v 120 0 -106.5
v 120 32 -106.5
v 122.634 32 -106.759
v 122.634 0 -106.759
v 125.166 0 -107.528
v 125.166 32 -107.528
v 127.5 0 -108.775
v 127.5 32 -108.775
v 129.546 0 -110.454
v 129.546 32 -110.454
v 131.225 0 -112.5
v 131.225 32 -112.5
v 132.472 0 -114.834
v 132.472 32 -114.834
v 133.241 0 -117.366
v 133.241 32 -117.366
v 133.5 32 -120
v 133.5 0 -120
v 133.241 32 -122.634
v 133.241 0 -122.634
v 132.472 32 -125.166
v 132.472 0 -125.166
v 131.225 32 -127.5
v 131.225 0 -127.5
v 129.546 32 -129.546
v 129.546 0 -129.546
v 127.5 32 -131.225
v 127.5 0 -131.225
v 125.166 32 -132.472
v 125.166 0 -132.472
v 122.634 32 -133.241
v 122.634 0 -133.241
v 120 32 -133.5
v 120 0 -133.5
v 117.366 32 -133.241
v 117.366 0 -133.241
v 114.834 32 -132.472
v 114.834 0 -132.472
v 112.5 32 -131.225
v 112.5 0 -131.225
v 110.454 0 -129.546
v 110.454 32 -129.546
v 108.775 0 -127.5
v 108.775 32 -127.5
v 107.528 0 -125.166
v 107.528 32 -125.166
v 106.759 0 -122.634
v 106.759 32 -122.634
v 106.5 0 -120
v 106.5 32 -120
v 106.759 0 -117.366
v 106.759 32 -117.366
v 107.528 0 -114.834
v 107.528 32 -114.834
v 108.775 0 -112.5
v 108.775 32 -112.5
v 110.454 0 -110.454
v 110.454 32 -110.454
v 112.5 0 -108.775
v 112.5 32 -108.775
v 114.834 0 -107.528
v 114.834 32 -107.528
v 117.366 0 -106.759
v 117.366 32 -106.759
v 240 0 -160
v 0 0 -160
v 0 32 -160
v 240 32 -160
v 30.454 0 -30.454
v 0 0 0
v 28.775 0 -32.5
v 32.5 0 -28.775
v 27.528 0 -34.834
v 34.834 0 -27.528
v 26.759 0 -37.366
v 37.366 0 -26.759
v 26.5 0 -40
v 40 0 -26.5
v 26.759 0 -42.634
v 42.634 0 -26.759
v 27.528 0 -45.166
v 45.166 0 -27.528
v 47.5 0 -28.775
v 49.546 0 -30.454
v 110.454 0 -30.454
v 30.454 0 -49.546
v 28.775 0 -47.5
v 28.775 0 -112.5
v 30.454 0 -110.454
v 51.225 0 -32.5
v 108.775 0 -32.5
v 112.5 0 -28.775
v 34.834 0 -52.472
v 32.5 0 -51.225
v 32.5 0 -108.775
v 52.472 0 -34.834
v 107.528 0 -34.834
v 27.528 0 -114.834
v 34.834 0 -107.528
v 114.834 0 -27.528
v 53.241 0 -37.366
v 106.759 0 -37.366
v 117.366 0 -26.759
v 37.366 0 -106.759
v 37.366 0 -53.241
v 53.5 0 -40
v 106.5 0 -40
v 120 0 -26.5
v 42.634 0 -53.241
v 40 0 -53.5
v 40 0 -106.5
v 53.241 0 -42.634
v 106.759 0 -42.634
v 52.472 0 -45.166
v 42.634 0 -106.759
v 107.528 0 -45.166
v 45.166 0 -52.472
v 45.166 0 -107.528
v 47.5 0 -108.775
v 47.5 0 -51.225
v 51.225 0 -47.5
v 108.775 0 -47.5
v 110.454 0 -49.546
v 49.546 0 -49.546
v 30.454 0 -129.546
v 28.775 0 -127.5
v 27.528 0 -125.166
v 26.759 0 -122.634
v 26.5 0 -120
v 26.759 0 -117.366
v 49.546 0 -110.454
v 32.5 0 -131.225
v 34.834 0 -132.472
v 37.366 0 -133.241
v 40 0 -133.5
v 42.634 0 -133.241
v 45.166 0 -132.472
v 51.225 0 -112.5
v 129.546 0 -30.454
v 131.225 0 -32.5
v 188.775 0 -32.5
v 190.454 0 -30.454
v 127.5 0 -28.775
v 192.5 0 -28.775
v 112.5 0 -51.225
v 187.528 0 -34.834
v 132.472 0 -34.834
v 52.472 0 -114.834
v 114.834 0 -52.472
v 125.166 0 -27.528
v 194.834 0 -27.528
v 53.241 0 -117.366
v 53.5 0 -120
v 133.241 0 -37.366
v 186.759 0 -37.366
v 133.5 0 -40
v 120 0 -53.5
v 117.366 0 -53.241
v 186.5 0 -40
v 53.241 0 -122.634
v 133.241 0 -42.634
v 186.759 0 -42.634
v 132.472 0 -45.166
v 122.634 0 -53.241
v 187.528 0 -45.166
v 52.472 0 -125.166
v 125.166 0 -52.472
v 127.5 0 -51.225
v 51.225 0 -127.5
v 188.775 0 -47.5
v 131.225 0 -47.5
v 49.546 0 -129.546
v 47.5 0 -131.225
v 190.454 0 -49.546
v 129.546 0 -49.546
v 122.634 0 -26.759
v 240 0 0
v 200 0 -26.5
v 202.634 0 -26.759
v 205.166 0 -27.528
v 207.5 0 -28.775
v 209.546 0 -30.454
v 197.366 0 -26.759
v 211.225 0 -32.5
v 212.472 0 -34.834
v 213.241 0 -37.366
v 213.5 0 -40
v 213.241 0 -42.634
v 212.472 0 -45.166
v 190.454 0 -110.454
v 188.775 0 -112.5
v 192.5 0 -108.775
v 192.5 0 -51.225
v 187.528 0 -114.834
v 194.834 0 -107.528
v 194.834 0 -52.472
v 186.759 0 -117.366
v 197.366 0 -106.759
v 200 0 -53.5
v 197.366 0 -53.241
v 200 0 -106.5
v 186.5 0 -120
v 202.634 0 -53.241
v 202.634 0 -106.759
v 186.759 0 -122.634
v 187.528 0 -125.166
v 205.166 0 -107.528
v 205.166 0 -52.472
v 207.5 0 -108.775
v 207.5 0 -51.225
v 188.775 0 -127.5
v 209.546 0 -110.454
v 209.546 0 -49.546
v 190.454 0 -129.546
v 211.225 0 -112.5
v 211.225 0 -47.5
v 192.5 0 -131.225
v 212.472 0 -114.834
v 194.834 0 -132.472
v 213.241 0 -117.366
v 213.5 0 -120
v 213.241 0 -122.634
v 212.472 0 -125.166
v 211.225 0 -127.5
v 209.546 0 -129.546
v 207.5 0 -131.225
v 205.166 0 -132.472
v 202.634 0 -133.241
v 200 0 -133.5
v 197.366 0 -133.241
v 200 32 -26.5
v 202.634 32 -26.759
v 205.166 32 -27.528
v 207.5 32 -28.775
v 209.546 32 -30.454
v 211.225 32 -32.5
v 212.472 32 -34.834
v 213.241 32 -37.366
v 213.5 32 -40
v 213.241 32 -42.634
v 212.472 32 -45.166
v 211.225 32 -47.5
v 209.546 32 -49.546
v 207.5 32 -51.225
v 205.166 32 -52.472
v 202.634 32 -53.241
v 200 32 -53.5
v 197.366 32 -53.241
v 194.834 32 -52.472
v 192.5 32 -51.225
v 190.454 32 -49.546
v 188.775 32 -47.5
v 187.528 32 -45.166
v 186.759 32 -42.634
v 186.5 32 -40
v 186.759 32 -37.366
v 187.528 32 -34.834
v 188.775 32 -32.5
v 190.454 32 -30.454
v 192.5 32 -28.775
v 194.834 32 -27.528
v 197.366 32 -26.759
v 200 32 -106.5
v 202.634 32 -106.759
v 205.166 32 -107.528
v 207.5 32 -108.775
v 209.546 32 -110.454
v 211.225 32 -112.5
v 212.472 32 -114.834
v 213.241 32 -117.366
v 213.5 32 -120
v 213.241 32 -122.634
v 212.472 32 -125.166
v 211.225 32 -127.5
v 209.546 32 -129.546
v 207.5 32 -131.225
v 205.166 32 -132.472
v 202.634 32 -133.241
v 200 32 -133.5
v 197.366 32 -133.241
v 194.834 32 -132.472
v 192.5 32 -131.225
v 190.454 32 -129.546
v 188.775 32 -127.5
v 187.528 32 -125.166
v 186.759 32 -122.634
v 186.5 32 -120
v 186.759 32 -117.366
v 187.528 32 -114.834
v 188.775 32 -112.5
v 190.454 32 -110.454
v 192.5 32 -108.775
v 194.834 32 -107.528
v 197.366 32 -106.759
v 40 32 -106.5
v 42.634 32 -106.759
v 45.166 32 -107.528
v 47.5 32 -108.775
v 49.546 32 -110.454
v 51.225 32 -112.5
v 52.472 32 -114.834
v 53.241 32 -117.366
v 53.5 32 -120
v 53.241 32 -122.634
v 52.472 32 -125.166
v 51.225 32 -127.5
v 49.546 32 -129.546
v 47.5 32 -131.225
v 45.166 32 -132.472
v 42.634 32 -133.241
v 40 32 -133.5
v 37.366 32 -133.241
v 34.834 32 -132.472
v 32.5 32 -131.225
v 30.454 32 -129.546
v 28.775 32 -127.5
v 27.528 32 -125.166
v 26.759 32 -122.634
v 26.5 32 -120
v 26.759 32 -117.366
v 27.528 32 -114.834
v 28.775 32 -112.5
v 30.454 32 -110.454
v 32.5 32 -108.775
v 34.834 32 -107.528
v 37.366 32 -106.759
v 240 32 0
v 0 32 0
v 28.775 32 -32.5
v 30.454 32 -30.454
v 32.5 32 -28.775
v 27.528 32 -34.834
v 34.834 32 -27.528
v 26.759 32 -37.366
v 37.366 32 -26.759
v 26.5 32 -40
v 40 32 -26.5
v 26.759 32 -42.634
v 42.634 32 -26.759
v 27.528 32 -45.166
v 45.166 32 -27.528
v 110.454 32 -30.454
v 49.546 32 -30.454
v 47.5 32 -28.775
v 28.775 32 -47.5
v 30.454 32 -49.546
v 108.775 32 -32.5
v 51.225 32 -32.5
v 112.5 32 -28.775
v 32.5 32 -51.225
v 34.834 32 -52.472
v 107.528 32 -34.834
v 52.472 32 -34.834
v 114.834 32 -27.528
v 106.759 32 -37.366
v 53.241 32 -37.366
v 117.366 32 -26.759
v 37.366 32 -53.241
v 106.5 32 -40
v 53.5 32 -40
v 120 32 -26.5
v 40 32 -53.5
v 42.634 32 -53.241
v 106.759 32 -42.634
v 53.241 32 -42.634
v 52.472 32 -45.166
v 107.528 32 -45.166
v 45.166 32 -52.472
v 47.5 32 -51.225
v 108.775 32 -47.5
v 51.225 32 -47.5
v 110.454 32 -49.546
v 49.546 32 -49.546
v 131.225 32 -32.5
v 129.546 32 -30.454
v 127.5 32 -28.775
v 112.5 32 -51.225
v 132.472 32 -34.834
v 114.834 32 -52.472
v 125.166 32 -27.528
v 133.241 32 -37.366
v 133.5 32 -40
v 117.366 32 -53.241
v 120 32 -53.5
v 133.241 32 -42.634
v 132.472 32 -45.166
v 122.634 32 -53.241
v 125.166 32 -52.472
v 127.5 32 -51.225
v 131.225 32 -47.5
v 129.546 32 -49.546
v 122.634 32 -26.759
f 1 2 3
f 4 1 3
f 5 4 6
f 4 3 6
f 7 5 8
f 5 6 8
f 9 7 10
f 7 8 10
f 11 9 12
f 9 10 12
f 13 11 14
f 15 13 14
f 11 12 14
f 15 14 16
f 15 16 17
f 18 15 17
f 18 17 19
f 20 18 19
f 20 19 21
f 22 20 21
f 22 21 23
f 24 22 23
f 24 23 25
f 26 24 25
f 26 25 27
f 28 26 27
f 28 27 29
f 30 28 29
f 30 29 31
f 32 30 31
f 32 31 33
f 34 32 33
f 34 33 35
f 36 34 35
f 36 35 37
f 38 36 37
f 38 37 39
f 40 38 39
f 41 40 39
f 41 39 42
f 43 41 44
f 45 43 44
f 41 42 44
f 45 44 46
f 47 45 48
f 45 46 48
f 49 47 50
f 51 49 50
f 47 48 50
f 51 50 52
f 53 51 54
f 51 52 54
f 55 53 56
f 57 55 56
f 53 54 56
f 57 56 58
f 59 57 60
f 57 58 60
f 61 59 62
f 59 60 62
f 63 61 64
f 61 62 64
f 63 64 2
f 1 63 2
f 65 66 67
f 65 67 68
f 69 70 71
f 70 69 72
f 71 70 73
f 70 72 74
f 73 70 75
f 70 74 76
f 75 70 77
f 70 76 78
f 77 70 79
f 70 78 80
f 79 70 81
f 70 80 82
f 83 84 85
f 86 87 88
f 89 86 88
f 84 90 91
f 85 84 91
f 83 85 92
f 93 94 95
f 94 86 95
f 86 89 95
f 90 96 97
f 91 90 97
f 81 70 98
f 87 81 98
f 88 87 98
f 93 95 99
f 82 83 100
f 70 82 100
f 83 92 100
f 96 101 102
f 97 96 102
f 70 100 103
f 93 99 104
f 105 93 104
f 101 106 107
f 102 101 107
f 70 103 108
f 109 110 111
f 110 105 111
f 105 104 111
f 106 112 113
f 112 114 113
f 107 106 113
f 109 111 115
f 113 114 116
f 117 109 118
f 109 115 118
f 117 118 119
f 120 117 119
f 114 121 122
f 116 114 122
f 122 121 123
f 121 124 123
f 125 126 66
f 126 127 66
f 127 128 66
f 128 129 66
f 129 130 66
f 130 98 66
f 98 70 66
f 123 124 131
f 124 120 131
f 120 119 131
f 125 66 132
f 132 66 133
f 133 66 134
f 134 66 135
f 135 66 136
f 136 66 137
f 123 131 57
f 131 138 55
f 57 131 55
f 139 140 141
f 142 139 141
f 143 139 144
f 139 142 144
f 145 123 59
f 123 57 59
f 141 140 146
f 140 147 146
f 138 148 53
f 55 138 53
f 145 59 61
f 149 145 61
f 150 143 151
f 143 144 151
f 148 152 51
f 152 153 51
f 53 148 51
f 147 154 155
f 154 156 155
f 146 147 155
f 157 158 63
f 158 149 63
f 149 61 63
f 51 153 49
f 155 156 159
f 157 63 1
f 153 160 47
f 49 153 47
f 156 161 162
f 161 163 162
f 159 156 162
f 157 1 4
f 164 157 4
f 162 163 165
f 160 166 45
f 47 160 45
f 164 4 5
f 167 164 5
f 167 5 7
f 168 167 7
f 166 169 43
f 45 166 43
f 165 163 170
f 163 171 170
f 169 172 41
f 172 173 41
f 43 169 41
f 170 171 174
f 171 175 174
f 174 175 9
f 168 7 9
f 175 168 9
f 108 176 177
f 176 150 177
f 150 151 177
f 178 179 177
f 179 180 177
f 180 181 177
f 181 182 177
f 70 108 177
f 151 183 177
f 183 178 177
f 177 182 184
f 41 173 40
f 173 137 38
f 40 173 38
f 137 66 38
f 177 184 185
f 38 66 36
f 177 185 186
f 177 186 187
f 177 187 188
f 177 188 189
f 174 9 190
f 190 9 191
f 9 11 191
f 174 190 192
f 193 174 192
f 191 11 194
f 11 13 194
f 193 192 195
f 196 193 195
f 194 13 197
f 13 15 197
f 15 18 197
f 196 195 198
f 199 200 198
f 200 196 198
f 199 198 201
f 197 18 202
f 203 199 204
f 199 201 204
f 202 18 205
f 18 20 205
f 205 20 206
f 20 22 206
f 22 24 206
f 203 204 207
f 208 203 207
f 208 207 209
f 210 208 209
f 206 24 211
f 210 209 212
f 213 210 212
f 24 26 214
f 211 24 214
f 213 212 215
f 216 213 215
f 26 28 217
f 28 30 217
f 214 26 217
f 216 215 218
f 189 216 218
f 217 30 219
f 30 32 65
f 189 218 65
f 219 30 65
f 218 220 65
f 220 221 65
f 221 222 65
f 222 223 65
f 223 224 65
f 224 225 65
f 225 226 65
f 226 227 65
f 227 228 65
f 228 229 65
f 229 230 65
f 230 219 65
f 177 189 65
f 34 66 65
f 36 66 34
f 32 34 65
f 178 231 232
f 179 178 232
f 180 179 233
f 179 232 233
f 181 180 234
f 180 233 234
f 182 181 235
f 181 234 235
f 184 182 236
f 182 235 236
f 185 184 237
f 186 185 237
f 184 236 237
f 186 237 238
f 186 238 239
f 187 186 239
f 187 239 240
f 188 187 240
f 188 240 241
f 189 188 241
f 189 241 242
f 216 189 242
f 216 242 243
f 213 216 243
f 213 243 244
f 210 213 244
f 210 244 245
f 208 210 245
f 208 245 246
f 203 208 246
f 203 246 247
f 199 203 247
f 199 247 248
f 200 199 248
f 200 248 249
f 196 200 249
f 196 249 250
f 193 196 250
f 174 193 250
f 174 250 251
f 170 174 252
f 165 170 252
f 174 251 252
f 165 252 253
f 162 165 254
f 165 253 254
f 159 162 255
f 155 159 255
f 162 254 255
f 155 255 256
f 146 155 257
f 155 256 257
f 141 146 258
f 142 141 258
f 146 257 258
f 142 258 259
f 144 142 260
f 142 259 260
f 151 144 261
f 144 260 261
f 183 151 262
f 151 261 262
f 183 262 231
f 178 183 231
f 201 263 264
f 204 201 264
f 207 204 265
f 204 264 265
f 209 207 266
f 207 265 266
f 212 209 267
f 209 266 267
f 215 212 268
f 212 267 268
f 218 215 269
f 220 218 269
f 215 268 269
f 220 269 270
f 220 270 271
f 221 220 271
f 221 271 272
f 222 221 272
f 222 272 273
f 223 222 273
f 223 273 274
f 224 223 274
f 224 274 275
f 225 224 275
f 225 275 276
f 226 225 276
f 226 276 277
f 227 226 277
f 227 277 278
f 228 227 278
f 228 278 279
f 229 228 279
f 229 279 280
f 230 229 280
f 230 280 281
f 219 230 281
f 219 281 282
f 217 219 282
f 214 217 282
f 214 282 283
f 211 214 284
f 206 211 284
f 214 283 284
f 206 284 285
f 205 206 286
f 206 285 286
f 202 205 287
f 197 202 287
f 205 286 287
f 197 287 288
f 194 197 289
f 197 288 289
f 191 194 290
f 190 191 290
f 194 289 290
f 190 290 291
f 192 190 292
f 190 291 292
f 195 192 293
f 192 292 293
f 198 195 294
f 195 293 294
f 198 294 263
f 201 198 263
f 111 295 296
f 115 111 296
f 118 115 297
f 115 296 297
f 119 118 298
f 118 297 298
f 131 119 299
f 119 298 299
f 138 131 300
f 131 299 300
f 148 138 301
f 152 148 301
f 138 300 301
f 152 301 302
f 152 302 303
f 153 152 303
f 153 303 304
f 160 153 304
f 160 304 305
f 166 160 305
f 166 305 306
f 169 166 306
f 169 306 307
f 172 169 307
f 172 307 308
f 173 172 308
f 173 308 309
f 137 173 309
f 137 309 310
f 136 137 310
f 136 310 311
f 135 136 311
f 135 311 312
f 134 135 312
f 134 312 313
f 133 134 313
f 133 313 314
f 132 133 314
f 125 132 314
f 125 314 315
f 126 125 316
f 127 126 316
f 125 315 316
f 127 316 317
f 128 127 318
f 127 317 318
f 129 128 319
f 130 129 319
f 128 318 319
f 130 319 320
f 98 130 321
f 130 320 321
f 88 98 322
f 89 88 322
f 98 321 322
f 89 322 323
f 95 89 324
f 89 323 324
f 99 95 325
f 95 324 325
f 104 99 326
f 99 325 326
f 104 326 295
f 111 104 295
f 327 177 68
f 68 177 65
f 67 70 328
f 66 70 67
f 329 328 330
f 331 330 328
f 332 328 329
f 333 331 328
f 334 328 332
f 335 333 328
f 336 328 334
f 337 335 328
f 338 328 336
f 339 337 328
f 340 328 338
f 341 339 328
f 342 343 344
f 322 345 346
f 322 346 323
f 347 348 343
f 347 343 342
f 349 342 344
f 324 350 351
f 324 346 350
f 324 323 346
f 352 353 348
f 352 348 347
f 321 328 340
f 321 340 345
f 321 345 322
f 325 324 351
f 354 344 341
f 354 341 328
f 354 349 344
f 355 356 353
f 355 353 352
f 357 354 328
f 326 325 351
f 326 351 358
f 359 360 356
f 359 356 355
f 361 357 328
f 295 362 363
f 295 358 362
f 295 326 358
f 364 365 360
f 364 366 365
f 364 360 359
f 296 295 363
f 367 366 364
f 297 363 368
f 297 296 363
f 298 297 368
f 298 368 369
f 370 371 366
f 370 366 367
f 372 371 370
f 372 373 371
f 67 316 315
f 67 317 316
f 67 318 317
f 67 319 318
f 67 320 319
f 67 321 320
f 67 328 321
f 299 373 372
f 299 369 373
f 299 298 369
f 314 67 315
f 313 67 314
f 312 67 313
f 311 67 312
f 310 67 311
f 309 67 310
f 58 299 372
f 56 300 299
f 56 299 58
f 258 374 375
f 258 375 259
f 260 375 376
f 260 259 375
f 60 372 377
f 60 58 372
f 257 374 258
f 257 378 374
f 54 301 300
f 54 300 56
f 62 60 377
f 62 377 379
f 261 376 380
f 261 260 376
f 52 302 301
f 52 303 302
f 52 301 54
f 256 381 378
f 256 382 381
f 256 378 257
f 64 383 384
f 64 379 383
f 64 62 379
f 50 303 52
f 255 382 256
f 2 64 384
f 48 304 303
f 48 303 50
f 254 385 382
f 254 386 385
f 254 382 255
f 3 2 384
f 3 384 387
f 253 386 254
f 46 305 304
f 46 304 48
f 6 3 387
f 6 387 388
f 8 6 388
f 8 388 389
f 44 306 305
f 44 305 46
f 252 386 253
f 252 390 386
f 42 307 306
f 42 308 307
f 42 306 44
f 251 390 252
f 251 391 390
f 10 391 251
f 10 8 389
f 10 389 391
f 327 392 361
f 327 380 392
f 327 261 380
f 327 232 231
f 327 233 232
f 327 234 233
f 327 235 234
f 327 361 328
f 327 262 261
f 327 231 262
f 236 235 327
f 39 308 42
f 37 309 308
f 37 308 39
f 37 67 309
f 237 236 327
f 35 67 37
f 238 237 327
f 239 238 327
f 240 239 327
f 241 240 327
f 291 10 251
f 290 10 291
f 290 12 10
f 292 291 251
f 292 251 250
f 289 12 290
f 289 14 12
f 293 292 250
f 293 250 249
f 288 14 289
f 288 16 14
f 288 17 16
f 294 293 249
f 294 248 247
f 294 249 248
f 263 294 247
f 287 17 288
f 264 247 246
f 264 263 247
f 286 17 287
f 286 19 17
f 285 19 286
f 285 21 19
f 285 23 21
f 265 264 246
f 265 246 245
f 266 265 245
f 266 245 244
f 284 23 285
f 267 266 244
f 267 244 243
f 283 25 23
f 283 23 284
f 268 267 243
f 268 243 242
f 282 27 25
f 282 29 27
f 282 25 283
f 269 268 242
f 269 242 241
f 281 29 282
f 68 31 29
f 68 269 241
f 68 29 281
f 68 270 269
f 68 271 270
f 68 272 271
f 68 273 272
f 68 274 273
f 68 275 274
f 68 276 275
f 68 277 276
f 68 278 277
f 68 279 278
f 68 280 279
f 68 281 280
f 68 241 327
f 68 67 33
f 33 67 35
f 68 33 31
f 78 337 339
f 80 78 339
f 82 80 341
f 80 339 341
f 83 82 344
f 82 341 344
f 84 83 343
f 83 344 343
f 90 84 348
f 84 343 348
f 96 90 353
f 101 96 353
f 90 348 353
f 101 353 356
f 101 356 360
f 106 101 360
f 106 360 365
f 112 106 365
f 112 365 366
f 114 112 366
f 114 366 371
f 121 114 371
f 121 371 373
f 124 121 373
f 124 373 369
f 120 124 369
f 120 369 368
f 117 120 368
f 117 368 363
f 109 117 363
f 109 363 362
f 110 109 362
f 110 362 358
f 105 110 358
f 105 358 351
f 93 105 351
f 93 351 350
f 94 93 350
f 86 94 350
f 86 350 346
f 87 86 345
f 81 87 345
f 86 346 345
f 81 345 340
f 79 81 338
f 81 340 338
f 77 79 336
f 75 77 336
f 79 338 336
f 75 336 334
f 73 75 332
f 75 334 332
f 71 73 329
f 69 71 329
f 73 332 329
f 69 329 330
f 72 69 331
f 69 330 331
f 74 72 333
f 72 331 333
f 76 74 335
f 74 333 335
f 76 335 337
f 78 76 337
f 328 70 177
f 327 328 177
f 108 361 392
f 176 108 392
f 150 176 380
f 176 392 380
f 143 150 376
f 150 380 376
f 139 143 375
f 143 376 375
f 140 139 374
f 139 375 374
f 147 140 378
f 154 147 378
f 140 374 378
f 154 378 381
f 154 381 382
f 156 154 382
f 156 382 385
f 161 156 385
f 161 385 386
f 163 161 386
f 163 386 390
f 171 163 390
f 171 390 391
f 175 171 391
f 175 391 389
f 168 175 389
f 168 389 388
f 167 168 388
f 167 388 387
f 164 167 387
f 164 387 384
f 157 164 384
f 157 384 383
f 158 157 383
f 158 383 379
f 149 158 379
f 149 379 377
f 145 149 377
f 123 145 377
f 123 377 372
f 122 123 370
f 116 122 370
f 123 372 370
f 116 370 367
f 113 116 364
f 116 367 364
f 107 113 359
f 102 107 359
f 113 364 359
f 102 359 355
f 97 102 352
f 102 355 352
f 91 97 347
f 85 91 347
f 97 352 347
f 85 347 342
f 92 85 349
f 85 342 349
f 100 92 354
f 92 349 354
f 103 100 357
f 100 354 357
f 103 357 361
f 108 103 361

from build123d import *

# Parameters (mm, degrees)
SKETCH_1_W                       = 240
SKETCH_1_H                       = 160
EXTRUDE_1_DEPTH                  = 32
SKETCH_3_R                       = 13.5
CUT_EXTRUDE_2_DEPTH              = 291.213714355
PATTERN_LINEAR_5_COUNT           = 2
PATTERN_LINEAR_5_PITCH           = 80
PATTERN_LINEAR_6_COUNT           = 2
PATTERN_LINEAR_6_PITCH           = 80
PATTERN_LINEAR_7_COUNT           = 2
PATTERN_LINEAR_7_PITCH           = 80
PATTERN_LINEAR_7_COPY_1_SKETCH_R = 13.5
PATTERN_LINEAR_7_COPY_1_DEPTH    = 291.213714355
PATTERN_LINEAR_7_COPY_2_SKETCH_R = 13.5
PATTERN_LINEAR_7_COPY_2_DEPTH    = 291.213714355


with BuildPart() as part:
    # 草图1 → 凸台-拉伸1 (new body)
    with BuildSketch(Plane(origin=(0, 0, 0), x_dir=(1, 0, 0), z_dir=(0, 1, 0))):
        with Locations((120, 80)):
            Rectangle(SKETCH_1_W, SKETCH_1_H)
    extrude(amount=EXTRUDE_1_DEPTH)

    # 草图3 → 切除-拉伸2 (cut, through all)
    with BuildSketch(Plane(origin=(0, 32, 0), x_dir=(1, 0, 0), z_dir=(0, 1, 0))):
        with Locations(Location((120, 120, 0), (0, 0, 270))):
            Circle(SKETCH_3_R)
    cut_extrude_2 = extrude(amount=-CUT_EXTRUDE_2_DEPTH, mode=Mode.SUBTRACT)

    # 阵列(线性)5: 切除-拉伸2 ×2
    with Locations(*[(-i * PATTERN_LINEAR_5_PITCH, 0, 0) for i in range(1, PATTERN_LINEAR_5_COUNT)]):
        add(cut_extrude_2, mode=Mode.SUBTRACT)

    # 阵列(线性)6: 切除-拉伸2 ×2
    with Locations(*[(i * PATTERN_LINEAR_6_PITCH, 0, 0) for i in range(1, PATTERN_LINEAR_6_COUNT)]):
        add(cut_extrude_2, mode=Mode.SUBTRACT)

    # 阵列(线性)7: 切除-拉伸2 ×2
    with Locations(*[(0, 0, i * PATTERN_LINEAR_7_PITCH) for i in range(1, PATTERN_LINEAR_7_COUNT)]):
        add(cut_extrude_2, mode=Mode.SUBTRACT)

    # 阵列(线性)7 copy 1 sketch → 阵列(线性)7 copy 1 (cut, through all)
    with BuildSketch(Plane(origin=(-80, 32, 80), x_dir=(1, 0, 0), z_dir=(0, 1, 0))):
        with Locations(Location((120, 120, 0), (0, 0, 270))):
            Circle(PATTERN_LINEAR_7_COPY_1_SKETCH_R)
    extrude(amount=-PATTERN_LINEAR_7_COPY_1_DEPTH, mode=Mode.SUBTRACT)

    # 阵列(线性)7 copy 2 sketch → 阵列(线性)7 copy 2 (cut, through all)
    with BuildSketch(Plane(origin=(80, 32, 80), x_dir=(1, 0, 0), z_dir=(0, 1, 0))):
        with Locations(Location((120, 120, 0), (0, 0, 270))):
            Circle(PATTERN_LINEAR_7_COPY_2_SKETCH_R)
    extrude(amount=-PATTERN_LINEAR_7_COPY_2_DEPTH, mode=Mode.SUBTRACT)


solid = part.part
